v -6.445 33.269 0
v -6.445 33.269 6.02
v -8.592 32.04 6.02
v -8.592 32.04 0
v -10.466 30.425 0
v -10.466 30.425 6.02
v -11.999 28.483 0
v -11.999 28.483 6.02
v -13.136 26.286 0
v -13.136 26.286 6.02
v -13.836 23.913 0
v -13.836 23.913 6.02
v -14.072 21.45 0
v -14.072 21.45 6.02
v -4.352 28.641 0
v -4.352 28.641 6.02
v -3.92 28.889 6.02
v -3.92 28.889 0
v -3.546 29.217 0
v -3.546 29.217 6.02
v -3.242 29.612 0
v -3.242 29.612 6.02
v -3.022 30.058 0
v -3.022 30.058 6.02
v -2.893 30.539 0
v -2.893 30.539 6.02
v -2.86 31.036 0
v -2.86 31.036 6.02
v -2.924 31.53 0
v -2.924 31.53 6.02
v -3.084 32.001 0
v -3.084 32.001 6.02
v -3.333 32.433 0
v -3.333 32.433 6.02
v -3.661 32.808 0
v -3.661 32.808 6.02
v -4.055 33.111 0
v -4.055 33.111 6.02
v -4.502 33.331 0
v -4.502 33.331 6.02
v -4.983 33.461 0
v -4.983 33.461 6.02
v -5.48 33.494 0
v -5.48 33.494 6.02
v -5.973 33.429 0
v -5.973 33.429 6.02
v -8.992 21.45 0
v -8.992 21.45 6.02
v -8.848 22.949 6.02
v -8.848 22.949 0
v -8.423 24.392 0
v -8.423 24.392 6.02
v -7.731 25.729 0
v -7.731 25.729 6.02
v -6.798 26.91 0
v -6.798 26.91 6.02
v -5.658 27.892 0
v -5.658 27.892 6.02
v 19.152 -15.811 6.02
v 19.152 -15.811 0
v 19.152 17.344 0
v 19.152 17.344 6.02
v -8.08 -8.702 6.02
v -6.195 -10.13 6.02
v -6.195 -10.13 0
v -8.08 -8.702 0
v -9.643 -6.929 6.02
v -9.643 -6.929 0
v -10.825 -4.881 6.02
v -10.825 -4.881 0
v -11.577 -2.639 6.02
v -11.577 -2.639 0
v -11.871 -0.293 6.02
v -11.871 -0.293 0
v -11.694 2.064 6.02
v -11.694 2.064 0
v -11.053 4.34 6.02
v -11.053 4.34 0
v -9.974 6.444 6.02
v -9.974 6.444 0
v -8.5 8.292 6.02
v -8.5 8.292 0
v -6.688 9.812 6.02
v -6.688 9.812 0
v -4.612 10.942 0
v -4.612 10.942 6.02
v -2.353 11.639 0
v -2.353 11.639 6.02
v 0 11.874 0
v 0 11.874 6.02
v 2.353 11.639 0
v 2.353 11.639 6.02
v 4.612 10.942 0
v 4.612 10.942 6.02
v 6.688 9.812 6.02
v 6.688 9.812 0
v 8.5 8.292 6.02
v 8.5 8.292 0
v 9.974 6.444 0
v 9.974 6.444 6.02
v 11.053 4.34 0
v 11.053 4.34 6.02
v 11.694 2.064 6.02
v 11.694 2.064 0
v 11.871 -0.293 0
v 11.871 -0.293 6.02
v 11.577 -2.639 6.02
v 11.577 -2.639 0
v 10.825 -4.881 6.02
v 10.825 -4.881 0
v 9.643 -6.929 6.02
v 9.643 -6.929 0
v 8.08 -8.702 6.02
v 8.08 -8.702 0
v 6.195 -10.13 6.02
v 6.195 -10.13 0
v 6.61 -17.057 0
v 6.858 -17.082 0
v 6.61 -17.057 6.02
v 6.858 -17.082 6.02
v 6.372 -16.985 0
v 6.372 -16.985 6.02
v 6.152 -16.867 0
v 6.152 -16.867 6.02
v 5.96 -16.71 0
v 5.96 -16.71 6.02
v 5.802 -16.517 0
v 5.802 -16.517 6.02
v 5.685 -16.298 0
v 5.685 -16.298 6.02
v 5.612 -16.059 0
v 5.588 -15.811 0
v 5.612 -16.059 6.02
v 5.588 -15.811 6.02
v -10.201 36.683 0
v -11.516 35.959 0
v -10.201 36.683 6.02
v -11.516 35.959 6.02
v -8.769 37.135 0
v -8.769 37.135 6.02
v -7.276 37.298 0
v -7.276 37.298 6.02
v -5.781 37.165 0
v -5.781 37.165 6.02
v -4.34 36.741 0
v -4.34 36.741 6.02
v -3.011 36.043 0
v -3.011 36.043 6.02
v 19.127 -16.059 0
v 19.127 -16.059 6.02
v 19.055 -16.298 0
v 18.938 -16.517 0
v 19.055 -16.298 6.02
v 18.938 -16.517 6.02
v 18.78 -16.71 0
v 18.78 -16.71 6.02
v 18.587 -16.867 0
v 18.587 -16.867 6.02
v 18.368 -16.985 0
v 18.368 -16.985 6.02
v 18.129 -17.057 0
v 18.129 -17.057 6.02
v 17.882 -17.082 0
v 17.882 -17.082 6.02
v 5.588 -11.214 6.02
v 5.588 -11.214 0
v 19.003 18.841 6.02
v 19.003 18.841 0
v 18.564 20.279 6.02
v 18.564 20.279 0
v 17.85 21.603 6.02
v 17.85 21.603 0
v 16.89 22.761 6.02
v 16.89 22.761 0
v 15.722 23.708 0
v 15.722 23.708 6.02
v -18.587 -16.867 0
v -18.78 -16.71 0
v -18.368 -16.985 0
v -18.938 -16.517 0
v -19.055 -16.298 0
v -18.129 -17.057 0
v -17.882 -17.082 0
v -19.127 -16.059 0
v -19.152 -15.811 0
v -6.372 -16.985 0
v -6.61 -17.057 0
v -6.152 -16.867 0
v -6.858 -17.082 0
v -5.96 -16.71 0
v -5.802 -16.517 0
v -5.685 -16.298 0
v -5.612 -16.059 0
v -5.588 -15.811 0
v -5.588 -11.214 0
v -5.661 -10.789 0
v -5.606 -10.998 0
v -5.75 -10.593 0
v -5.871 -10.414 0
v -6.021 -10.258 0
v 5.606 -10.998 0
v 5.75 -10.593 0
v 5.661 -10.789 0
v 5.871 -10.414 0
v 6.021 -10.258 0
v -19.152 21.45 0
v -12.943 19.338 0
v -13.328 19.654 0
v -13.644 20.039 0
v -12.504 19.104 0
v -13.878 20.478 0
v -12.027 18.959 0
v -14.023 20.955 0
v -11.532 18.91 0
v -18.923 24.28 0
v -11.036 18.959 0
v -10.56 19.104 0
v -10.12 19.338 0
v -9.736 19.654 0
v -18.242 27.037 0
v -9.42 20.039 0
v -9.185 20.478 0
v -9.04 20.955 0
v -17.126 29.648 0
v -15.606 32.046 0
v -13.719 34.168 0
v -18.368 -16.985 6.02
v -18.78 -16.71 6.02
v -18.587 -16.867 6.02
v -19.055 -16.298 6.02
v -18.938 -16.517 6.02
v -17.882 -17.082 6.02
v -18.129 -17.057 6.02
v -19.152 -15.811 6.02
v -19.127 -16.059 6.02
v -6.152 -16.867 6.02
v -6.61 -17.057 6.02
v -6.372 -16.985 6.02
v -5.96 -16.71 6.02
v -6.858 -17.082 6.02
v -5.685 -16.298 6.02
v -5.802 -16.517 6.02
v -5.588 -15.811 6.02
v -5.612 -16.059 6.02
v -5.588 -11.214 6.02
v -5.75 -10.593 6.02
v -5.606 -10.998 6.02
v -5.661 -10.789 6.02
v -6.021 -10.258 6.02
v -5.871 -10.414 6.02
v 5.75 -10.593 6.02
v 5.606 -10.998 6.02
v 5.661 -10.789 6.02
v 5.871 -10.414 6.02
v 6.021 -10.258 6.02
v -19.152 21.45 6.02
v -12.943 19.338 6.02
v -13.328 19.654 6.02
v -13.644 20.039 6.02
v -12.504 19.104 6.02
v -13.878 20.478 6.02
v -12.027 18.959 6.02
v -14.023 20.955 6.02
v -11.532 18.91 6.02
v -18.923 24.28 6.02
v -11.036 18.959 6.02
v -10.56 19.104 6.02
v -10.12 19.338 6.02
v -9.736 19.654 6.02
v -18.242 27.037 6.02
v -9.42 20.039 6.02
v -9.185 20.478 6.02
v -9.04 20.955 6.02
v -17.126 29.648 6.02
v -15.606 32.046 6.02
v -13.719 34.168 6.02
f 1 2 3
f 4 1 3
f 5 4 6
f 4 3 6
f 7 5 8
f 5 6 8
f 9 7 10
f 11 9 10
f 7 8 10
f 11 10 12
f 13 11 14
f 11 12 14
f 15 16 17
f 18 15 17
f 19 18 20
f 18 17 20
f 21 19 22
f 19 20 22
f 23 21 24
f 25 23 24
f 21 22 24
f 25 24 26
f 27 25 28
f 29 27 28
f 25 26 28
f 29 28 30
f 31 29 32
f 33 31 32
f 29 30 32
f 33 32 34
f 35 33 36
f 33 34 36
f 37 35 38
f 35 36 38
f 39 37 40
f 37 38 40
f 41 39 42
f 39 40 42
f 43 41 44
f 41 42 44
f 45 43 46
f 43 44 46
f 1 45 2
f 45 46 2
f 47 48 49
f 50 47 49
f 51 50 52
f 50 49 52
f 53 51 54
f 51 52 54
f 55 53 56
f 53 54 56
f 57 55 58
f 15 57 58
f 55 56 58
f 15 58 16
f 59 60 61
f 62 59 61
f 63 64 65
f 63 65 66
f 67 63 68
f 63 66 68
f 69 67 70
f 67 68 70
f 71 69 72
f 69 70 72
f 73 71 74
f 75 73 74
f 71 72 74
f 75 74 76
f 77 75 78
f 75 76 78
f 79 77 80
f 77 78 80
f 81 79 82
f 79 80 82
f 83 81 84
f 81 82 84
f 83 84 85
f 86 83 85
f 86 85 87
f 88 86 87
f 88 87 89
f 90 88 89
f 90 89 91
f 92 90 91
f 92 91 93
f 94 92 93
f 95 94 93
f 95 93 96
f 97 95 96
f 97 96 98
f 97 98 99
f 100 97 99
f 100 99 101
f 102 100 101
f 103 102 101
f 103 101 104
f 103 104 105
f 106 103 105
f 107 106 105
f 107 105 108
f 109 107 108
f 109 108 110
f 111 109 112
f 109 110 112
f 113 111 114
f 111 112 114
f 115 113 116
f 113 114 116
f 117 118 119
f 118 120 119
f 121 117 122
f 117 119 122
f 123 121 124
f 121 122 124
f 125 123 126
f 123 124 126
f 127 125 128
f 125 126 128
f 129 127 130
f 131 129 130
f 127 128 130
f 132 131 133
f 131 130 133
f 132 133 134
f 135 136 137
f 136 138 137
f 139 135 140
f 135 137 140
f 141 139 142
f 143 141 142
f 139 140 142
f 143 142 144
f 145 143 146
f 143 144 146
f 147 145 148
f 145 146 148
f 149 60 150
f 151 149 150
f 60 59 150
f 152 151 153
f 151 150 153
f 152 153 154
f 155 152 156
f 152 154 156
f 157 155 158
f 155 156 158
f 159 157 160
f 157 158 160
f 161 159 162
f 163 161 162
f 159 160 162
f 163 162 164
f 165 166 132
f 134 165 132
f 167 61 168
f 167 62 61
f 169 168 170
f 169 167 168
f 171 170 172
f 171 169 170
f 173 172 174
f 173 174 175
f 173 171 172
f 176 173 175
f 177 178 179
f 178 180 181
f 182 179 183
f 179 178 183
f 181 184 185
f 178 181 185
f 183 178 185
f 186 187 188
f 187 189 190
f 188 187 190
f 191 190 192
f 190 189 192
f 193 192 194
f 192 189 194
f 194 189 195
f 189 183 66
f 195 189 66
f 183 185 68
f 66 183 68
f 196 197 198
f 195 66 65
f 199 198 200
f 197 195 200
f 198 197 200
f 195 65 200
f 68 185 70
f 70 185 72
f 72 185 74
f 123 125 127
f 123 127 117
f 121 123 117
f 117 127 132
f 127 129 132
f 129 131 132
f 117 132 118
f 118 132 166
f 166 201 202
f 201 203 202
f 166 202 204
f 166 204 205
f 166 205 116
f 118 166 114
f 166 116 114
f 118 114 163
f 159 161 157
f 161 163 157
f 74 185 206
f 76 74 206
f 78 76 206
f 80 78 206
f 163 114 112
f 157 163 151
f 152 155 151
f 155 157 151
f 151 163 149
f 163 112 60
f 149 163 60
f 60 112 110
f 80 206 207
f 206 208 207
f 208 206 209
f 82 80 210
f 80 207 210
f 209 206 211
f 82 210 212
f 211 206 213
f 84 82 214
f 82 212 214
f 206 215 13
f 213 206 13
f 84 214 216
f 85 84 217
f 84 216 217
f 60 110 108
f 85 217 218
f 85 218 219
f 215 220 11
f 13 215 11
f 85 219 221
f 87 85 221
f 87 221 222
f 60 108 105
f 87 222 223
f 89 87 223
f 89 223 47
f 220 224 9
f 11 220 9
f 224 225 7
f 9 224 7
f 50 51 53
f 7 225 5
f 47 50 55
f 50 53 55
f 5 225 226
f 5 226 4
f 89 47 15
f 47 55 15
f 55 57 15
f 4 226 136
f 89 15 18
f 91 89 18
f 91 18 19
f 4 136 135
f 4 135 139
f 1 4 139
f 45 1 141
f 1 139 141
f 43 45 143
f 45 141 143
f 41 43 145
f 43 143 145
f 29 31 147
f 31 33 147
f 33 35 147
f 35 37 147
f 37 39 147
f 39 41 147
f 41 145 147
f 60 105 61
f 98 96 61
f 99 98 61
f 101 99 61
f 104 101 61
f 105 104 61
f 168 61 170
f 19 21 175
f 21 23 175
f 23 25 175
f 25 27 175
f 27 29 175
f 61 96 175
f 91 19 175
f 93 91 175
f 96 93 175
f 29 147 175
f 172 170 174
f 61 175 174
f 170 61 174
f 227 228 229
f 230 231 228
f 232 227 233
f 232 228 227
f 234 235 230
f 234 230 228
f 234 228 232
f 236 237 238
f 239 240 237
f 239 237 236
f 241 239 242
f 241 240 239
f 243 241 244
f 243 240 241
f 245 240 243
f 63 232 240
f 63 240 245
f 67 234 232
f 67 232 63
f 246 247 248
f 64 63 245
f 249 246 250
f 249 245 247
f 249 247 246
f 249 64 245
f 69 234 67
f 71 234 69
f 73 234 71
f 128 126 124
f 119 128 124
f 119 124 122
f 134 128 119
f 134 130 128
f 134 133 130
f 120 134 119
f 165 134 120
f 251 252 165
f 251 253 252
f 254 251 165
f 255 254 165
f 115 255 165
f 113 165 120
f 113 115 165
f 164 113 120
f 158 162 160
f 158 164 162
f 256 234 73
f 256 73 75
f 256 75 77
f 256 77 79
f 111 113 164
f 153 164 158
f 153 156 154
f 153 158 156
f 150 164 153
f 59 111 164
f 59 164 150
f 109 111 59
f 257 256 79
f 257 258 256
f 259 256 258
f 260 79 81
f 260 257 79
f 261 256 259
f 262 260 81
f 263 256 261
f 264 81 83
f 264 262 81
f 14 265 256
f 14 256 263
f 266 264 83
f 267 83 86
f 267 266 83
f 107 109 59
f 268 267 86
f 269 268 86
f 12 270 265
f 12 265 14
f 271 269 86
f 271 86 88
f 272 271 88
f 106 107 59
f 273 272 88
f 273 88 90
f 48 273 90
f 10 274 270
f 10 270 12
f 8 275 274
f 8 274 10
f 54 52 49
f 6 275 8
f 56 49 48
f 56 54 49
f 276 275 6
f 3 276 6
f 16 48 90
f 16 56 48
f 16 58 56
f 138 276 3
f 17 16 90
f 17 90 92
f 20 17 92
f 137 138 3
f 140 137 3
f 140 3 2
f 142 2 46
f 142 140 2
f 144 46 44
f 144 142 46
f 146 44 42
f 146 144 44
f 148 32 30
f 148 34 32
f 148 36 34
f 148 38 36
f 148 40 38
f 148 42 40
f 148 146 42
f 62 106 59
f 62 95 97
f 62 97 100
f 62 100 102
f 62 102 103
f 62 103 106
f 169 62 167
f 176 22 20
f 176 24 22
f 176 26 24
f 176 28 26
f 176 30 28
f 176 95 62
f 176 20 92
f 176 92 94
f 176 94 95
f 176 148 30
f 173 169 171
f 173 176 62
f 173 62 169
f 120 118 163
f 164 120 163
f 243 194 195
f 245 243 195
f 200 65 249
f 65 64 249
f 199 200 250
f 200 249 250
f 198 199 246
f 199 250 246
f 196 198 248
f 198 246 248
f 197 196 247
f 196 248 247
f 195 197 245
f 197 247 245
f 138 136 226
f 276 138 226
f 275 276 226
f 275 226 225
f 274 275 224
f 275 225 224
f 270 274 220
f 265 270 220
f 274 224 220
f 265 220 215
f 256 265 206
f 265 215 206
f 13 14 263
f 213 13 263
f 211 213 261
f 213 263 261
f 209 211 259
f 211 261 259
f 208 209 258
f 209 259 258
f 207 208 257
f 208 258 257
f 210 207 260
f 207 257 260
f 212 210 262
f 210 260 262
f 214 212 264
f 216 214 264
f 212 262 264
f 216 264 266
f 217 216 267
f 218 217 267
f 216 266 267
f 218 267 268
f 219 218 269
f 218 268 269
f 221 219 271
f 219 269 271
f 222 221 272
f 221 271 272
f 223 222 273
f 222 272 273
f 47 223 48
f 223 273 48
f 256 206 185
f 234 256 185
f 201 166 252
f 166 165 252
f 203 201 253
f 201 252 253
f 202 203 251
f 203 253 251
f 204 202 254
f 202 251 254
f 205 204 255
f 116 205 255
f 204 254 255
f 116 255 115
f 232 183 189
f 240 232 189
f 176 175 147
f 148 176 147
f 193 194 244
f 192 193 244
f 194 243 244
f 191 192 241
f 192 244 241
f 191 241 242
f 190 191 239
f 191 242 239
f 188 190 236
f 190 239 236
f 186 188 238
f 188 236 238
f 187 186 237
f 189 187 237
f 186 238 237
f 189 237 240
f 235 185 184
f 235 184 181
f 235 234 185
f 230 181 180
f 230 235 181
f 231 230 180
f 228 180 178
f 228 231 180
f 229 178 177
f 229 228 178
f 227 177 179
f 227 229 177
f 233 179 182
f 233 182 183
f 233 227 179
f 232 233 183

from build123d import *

# Parameters (mm, degrees)
F1_DEPTH = 6.0198
F3_DEPTH = 6.0198
F4_R     = 7.62
F5_R     = 1.27


with BuildPart() as f1:
    # F0 (on Top) → F1 (new body)
    with BuildSketch(Plane.XY):
        with BuildLine():
            ThreePointArc((-5.588, -10.4775), (0, 11.8745), (5.588, -10.4775))
            Line((5.588, -10.4775), (5.588, -17.0815))
            Line((5.588, -17.0815), (19.1516, -17.0815))
            Line((19.1516, -17.0815), (19.1516, 21.4503))
            Line((19.1516, 21.4503), (-6.5024, 38.3413))
            ThreePointArc((-6.5024, 38.3413), (-15.638779, 32.001463), (-19.1516, 21.4503))
            Line((-19.1516, 21.4503), (-19.1516, -17.0815))
            Line((-19.1516, -17.0815), (-5.588, -17.0815))
            Line((-5.588, -17.0815), (-5.588, -10.4775))
        make_face()
    extrude(amount=F1_DEPTH)

    # F2 (on face) → F3 (cut, through all)
    with BuildSketch(Plane.XY.offset(6.0198)):
        with BuildLine():
            ThreePointArc((-6.444942, 33.269299), (-11.999418, 28.483341), (-14.0716, 21.4503))
            ThreePointArc((-14.0716, 21.4503), (-11.5316, 18.9103), (-8.9916, 21.4503))
            ThreePointArc((-8.9916, 21.4503), (-7.730957, 25.728955), (-4.35181, 28.640563))
            ThreePointArc((-4.35181, 28.640563), (-3.084008, 32.001498), (-6.444942, 33.269299))
        make_face()
    extrude(amount=-F3_DEPTH, mode=Mode.SUBTRACT)

    # F4
    f4_edges = [f1.edges().sort_by_distance(p)[0] for p in [
        (-6.5024, 38.3413, 3.0099),
        (19.1516, 21.4503, 3.0099),
    ]]
    fillet(f4_edges, radius=F4_R)

    # F5
    f5_edges = [f1.edges().sort_by_distance(p)[0] for p in [
        (-19.1516, -17.0815, 3.0099),
        (-5.588, -17.0815, 3.0099),
        (5.588, -17.0815, 3.0099),
        (19.1516, -17.0815, 3.0099),
        (5.588, -10.4775, 3.0099),
        (-5.588, -10.4775, 3.0099),
    ]]
    fillet(f5_edges, radius=F5_R)


solid = f1.part
